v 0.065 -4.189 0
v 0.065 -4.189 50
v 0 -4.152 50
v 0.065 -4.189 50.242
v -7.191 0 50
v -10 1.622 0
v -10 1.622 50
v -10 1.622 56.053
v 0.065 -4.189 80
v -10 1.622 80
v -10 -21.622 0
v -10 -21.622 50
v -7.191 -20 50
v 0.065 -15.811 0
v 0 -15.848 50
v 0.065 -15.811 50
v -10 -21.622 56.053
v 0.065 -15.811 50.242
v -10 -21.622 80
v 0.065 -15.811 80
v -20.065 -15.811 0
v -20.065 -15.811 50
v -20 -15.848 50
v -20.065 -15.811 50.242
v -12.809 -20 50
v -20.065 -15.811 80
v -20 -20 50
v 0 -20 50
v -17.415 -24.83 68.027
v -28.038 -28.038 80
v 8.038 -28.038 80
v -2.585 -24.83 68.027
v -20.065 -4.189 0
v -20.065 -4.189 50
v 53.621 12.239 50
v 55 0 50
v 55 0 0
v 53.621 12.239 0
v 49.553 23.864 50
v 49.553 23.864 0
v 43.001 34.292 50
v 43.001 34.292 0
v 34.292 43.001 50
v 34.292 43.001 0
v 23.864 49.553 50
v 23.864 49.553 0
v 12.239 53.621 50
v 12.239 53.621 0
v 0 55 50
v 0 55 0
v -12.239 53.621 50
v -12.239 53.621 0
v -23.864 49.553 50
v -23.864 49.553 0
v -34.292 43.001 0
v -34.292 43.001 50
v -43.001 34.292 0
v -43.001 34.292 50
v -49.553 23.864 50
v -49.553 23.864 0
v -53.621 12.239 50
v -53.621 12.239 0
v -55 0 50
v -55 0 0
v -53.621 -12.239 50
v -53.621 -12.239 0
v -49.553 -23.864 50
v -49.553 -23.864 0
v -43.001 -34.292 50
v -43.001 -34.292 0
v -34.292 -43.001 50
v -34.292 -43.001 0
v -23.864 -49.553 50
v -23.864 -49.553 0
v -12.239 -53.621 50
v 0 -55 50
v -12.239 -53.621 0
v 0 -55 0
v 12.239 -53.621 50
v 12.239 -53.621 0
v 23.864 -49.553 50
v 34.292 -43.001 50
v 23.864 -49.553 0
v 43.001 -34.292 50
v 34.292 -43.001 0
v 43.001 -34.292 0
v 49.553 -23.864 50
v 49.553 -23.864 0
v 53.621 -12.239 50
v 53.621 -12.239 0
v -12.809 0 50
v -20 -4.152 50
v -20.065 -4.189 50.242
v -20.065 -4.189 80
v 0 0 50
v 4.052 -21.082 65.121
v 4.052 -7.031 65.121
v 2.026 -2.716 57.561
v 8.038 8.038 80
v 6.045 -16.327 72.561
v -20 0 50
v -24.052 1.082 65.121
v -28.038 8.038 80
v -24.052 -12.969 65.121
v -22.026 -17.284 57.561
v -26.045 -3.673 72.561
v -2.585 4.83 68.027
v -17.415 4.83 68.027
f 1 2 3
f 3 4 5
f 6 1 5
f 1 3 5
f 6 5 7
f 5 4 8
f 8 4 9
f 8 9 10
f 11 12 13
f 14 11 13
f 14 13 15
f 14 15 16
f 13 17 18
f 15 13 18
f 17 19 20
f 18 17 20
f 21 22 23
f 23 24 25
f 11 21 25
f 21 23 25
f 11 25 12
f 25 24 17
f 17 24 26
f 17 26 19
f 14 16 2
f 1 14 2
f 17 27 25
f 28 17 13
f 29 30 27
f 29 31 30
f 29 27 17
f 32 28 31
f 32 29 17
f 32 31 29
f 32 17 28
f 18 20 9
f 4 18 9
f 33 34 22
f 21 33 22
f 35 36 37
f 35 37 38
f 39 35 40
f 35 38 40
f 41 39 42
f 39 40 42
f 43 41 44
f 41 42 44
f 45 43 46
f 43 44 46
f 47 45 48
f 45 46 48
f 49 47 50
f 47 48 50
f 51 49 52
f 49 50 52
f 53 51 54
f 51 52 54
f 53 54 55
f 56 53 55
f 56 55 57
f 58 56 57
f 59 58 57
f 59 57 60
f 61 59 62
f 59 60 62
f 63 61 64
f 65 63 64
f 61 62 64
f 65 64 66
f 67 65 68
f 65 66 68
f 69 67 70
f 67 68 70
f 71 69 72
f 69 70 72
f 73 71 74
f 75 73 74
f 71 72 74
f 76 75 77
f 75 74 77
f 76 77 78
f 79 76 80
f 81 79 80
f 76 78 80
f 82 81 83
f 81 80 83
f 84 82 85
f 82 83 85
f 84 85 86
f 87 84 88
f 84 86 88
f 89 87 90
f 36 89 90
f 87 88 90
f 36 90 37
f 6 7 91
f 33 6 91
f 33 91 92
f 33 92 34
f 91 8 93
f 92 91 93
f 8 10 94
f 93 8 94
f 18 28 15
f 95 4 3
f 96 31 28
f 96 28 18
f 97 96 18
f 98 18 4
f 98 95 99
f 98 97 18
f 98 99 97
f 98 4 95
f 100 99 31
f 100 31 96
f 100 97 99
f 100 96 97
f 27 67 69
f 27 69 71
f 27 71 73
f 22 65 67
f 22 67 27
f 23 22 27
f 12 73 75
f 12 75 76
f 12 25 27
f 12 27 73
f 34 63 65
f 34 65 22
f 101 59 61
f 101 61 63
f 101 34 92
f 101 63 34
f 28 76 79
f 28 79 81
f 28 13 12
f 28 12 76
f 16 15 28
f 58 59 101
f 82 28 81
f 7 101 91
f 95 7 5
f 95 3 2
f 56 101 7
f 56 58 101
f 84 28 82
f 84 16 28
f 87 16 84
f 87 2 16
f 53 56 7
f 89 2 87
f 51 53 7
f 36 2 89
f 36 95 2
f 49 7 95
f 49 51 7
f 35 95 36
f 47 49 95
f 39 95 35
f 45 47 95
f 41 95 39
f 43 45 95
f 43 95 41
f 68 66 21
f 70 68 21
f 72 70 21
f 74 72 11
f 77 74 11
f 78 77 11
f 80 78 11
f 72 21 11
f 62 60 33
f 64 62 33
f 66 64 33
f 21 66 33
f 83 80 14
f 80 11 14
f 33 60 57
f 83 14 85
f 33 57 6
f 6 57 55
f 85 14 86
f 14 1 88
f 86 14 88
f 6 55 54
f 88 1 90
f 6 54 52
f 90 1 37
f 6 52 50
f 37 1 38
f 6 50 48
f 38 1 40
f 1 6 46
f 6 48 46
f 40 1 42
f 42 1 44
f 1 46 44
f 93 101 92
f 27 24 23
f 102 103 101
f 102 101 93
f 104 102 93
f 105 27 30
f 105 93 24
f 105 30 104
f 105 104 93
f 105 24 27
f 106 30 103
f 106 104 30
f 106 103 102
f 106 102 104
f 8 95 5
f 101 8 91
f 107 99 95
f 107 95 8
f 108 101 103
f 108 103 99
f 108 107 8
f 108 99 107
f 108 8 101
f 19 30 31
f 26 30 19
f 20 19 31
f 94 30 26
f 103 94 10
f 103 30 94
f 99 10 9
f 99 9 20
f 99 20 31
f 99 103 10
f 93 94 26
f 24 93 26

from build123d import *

# Parameters (mm, degrees)
F0_R     = 55
F1_DEPTH = 50
F2_W     = 20
F2_H     = 20
F3_DEPTH = 30
F3_TAPER = -15
F5_DEPTH = 100


with BuildPart() as f1:
    # F0 (on Top) → F1 (new body)
    with BuildSketch(Plane.XY):
        Circle(F0_R)
    extrude(amount=F1_DEPTH)

    # F2 (on face) → F3 (join)
    with BuildSketch(Plane.XY.offset(50)):
        with Locations((-10, -10)):
            Rectangle(F2_W, F2_H)
    extrude(amount=F3_DEPTH, taper=F3_TAPER)

    # F4 (on face) → F5 (cut)
    with BuildSketch(Plane.XY.offset(80)):
        Polygon((0.0648668621, -4.1890464078), (-10, 1.6219071844), (-20.0648668621, -4.1890464078), (-20.0648668621, -15.8109535922), (-10, -21.6219071844), (0.0648668621, -15.8109535922), align=None)
    extrude(amount=-F5_DEPTH, mode=Mode.SUBTRACT)


solid = f1.part
